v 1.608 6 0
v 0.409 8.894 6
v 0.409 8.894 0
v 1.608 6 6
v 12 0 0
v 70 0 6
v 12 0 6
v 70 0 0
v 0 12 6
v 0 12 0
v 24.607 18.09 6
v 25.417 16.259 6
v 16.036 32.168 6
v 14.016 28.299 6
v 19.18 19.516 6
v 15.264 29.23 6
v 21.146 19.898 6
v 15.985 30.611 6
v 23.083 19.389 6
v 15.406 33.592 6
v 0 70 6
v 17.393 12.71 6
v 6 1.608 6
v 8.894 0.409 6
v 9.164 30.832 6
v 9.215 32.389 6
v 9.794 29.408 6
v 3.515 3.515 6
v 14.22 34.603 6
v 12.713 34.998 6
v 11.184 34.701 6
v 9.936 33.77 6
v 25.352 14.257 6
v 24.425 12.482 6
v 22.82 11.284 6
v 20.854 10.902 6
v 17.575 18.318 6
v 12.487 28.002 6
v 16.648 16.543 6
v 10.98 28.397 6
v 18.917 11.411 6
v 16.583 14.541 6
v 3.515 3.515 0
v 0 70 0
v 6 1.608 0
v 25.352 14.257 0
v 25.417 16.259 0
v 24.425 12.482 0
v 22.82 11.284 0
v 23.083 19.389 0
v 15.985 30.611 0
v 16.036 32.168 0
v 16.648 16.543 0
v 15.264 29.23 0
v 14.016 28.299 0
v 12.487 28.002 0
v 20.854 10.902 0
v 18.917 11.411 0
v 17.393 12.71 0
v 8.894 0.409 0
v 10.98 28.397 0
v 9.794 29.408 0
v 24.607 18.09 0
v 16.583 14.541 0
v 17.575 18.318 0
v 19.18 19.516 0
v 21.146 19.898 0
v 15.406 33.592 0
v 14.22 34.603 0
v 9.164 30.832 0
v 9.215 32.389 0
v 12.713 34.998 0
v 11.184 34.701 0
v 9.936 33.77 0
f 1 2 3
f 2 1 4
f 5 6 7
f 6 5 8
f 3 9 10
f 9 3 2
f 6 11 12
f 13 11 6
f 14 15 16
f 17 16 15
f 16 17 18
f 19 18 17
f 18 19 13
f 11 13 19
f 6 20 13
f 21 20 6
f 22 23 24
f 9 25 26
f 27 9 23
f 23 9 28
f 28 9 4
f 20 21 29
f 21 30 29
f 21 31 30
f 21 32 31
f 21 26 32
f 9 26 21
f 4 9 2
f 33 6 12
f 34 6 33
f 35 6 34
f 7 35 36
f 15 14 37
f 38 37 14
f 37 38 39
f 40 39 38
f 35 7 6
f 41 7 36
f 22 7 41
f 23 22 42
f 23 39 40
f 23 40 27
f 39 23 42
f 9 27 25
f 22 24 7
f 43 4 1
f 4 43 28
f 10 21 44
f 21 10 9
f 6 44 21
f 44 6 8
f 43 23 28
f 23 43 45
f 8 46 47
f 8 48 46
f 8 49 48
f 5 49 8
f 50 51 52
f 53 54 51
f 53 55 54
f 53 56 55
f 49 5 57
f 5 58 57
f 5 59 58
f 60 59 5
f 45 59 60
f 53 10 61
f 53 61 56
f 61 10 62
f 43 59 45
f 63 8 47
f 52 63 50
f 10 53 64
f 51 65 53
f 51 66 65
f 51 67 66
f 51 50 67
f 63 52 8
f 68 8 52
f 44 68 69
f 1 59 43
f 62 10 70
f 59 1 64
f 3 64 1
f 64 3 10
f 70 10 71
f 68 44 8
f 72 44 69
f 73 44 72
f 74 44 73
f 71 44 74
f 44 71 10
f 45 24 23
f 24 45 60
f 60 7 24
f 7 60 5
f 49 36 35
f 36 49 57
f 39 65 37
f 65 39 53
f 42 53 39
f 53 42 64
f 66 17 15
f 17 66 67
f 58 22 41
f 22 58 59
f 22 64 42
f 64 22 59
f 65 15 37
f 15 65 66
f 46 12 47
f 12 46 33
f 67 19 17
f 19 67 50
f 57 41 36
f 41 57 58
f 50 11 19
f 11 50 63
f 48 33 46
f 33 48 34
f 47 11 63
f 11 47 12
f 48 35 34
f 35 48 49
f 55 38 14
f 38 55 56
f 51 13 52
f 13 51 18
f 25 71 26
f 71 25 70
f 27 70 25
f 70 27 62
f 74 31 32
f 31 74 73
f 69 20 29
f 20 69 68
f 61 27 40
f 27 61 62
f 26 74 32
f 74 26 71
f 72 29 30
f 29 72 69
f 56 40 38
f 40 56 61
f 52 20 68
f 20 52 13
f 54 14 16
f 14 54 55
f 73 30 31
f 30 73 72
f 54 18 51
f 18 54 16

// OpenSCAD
$fn = 32;

// ----------------------------------------------------------------------
// Bracket plate: corner pad 70 x 70, fillet R12
// ----------------------------------------------------------------------

// --- parameters (mm) ---
hole_r = 3.5;             // bolt hole radius
plate_t = 6;              // plate thickness, Z (extrusion height)
leg_a = 70;               // base leg
leg_b = 70;               // height leg
fillet_r = 12;            // right-angle fillet radius

hole_d1 = 2 * hole_r + 2;
hole_d2 = 2 * hole_r;

profile = [[12, 0], [70, 0], [0, 70], [0, 12], [0.409, 8.894], [1.608, 6], [3.515, 3.515], [6, 1.608], [8.894, 0.409]];  // primary outline, 9 points, counter clockwise
void_1 = [[25.417, 16.259], [24.607, 18.09], [23.083, 19.389], [21.146, 19.898], [19.18, 19.516], [17.575, 18.318], [16.648, 16.543], [16.583, 14.541], [17.393, 12.71], [18.917, 11.411], [20.854, 10.902], [22.82, 11.284], [24.425, 12.482], [25.352, 14.257]];  // mount hole 1, 14 points
void_2 = [[16.036, 32.168], [15.406, 33.592], [14.22, 34.603], [12.713, 34.998], [11.184, 34.701], [9.936, 33.77], [9.215, 32.389], [9.164, 30.832], [9.794, 29.408], [10.98, 28.397], [12.487, 28.002], [14.016, 28.299], [15.264, 29.23], [15.985, 30.611]];  // mount hole 2, 14 points

// --- the one profile operation ---
difference() {
  linear_extrude(height = plate_t) polygon(points = profile);
  translate([0, 0, -1])
    linear_extrude(height = plate_t + 2) polygon(points = void_1);
  translate([0, 0, -1])
    linear_extrude(height = plate_t + 2) polygon(points = void_2);
}
